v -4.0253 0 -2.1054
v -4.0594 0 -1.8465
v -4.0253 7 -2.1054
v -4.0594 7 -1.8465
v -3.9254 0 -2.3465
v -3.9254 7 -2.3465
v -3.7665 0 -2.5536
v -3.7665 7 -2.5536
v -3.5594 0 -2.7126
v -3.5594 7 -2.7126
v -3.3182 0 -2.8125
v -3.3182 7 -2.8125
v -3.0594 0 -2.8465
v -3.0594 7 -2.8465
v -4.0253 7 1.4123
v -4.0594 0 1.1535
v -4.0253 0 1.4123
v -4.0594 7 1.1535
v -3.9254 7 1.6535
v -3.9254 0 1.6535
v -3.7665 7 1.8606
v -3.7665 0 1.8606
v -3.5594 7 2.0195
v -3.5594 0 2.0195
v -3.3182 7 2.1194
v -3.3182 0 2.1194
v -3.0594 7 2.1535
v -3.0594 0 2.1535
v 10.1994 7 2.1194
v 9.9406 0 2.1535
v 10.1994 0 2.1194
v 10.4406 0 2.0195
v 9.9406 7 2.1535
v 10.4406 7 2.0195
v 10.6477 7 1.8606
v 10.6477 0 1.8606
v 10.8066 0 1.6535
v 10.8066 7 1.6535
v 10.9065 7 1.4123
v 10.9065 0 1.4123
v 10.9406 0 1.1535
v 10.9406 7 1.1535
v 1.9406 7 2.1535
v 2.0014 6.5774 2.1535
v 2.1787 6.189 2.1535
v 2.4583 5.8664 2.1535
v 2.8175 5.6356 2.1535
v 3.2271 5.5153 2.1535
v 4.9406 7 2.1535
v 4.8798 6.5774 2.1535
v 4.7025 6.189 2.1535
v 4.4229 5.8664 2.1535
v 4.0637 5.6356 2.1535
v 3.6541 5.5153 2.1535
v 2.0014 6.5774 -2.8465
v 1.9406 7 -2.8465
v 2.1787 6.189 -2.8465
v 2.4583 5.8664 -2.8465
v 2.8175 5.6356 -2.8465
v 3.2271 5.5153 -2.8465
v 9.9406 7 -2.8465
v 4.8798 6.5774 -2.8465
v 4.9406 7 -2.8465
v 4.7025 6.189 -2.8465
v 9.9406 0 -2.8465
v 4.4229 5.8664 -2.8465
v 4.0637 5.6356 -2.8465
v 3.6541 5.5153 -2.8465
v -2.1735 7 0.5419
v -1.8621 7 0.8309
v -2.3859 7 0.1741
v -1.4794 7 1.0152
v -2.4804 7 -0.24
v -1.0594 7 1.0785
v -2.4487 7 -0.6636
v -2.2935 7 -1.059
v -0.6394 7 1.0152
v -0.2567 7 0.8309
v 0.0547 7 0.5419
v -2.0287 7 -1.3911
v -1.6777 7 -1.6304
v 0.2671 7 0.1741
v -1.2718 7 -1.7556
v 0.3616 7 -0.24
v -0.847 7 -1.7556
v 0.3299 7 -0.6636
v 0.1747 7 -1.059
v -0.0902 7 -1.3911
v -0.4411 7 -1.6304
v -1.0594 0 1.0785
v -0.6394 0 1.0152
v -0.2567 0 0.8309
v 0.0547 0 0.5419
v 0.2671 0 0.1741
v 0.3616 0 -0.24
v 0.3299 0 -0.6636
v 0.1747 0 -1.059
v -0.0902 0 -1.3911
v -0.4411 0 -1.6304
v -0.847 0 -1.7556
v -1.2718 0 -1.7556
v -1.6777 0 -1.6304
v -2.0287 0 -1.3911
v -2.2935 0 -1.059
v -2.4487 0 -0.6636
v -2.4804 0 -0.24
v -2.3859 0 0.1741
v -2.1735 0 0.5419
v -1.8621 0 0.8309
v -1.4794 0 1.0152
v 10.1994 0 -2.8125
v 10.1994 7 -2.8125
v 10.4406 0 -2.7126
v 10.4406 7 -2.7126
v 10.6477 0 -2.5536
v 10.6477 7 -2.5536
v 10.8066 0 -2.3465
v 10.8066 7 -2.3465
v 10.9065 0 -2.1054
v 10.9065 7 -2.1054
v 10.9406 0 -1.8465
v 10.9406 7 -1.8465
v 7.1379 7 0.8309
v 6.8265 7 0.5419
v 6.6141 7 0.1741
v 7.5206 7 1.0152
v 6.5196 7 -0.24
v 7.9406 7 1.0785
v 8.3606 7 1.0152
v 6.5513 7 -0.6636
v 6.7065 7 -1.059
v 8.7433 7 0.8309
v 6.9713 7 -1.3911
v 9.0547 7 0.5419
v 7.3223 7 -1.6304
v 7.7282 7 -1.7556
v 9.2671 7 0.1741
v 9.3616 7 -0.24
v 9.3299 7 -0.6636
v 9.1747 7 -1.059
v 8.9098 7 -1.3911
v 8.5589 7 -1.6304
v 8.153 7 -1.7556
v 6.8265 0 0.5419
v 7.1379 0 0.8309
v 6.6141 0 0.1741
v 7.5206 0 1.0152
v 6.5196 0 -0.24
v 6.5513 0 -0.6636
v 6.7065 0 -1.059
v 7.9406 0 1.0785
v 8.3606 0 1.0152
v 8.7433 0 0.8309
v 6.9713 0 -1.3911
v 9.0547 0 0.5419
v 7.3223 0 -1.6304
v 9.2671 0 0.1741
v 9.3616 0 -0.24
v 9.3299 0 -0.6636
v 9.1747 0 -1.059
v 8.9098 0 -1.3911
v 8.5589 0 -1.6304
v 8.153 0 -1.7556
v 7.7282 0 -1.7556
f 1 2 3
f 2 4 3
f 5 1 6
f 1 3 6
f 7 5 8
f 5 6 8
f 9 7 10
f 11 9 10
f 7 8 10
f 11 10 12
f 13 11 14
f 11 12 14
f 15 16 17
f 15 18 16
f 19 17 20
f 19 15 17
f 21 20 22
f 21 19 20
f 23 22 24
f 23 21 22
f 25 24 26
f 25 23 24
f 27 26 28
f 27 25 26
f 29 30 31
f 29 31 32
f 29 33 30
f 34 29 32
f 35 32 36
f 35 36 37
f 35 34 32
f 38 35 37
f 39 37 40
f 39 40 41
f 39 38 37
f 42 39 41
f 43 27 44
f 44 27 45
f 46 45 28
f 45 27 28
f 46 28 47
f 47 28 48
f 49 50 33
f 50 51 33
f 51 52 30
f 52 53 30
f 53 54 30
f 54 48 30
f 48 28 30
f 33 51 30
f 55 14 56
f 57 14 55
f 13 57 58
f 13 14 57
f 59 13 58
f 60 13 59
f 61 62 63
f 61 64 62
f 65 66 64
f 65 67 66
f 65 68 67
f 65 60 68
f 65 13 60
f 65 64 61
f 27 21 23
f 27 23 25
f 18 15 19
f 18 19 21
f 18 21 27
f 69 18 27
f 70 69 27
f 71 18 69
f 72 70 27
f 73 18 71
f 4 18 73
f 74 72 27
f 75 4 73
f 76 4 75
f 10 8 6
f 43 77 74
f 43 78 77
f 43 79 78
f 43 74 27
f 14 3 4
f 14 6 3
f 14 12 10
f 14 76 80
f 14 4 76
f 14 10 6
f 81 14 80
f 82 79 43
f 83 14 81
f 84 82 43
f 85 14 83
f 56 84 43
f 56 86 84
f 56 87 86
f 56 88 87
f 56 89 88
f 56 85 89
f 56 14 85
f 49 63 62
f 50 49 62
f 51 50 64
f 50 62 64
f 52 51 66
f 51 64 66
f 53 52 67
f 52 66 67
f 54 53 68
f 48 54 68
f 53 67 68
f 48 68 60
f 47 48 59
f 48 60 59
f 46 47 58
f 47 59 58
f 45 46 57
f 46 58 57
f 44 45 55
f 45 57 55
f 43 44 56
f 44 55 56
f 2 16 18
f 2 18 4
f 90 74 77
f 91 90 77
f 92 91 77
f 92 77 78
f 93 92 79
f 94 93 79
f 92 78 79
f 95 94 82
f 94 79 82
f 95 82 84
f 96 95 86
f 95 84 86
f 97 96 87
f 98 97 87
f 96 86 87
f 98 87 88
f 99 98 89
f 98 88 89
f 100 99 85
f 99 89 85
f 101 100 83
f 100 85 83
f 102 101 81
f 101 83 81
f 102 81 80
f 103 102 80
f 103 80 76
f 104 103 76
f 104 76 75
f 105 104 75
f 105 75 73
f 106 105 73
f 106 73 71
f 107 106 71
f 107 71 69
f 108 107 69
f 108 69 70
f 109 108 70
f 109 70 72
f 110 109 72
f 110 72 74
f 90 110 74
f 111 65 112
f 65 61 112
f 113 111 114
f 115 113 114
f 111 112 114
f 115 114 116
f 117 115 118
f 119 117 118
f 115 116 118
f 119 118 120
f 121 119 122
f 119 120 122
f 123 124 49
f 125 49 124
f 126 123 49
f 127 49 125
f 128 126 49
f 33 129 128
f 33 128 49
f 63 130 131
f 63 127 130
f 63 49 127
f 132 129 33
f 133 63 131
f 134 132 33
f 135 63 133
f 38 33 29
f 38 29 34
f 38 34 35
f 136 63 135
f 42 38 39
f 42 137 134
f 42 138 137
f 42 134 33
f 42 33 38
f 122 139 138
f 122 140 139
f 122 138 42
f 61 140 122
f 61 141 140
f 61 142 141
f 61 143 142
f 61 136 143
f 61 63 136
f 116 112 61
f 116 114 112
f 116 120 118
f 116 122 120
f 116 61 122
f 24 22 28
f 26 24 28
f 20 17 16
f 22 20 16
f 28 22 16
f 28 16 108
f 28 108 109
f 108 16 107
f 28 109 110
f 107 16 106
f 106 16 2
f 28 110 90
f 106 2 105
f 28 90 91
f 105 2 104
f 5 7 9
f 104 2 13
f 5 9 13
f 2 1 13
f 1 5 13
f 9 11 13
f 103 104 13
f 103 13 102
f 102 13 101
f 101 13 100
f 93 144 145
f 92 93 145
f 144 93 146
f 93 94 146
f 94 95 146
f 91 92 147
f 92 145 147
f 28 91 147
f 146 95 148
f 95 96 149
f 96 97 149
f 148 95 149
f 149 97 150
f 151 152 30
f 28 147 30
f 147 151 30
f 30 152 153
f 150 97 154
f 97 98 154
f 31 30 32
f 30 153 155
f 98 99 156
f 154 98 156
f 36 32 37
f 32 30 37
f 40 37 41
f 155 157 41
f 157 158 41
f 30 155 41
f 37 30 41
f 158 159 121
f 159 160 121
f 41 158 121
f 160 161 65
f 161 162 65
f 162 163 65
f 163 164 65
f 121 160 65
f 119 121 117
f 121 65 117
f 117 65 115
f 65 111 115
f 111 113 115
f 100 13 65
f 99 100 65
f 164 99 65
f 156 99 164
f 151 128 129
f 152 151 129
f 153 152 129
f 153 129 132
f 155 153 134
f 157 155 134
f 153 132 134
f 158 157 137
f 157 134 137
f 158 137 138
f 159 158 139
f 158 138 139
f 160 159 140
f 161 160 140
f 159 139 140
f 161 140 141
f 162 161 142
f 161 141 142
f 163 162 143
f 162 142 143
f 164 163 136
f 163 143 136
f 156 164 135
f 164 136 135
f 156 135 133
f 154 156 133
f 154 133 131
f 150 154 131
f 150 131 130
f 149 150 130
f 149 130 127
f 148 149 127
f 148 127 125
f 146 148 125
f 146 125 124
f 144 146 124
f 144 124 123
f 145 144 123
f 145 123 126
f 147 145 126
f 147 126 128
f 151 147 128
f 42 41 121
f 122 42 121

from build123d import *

# Parameters (mm, degrees)
SKETCH1_W           = 15
SKETCH1_H           = 5
BOSS_EXTRUDE1_DEPTH = 7
SKETCH2_R           = 1.5
CUT_EXTRUDE1_DEPTH  = 14.917492532
SKETCH3_R           = 1.425
CUT_EXTRUDE2_DEPTH  = 14.296591966
FILLET1_R           = 1


with BuildPart() as part:
    # Sketch1 → Boss-Extrude1 (new body)
    with BuildSketch(Plane(origin=(0, 0, 0), x_dir=(1, 0, 0), z_dir=(0, 1, 0))):
        with Locations((3.440594059, 0.346534653)):
            Rectangle(SKETCH1_W, SKETCH1_H)
    extrude(amount=BOSS_EXTRUDE1_DEPTH)

    # Sketch2 → Cut-Extrude1 (cut, through all)
    with BuildSketch(Plane(origin=(0, 0, -2.846534653), x_dir=(-1, 0, 0), z_dir=(0, 0, -1))):
        with Locations((-3.440594059, 7)):
            Circle(SKETCH2_R)
    extrude(amount=-CUT_EXTRUDE1_DEPTH, mode=Mode.SUBTRACT)

    # Sketch3 → Cut-Extrude2 (cut, through all)
    with BuildSketch(Plane(origin=(0, 7, 0), x_dir=(1, 0, 0), z_dir=(0, 1, 0))):
        with Locations(Location((7.940594059, 0.346534653, 0), (0, 0, 270))):
            Circle(SKETCH3_R)
        with Locations(Location((-1.059405941, 0.346534653, 0), (0, 0, 270))):
            Circle(SKETCH3_R)
    extrude(amount=-CUT_EXTRUDE2_DEPTH, mode=Mode.SUBTRACT)

    # Fillet1
    fillet1_edges = [part.edges().sort_by_distance(p)[0] for p in [
        (-4.059405941, 3.5, -2.846534653),
        (10.940594059, 3.5, -2.846534653),
        (10.940594059, 3.5, 2.153465347),
        (-4.059405941, 3.5, 2.153465347),
    ]]
    fillet(fillet1_edges, radius=FILLET1_R)


solid = part.part
